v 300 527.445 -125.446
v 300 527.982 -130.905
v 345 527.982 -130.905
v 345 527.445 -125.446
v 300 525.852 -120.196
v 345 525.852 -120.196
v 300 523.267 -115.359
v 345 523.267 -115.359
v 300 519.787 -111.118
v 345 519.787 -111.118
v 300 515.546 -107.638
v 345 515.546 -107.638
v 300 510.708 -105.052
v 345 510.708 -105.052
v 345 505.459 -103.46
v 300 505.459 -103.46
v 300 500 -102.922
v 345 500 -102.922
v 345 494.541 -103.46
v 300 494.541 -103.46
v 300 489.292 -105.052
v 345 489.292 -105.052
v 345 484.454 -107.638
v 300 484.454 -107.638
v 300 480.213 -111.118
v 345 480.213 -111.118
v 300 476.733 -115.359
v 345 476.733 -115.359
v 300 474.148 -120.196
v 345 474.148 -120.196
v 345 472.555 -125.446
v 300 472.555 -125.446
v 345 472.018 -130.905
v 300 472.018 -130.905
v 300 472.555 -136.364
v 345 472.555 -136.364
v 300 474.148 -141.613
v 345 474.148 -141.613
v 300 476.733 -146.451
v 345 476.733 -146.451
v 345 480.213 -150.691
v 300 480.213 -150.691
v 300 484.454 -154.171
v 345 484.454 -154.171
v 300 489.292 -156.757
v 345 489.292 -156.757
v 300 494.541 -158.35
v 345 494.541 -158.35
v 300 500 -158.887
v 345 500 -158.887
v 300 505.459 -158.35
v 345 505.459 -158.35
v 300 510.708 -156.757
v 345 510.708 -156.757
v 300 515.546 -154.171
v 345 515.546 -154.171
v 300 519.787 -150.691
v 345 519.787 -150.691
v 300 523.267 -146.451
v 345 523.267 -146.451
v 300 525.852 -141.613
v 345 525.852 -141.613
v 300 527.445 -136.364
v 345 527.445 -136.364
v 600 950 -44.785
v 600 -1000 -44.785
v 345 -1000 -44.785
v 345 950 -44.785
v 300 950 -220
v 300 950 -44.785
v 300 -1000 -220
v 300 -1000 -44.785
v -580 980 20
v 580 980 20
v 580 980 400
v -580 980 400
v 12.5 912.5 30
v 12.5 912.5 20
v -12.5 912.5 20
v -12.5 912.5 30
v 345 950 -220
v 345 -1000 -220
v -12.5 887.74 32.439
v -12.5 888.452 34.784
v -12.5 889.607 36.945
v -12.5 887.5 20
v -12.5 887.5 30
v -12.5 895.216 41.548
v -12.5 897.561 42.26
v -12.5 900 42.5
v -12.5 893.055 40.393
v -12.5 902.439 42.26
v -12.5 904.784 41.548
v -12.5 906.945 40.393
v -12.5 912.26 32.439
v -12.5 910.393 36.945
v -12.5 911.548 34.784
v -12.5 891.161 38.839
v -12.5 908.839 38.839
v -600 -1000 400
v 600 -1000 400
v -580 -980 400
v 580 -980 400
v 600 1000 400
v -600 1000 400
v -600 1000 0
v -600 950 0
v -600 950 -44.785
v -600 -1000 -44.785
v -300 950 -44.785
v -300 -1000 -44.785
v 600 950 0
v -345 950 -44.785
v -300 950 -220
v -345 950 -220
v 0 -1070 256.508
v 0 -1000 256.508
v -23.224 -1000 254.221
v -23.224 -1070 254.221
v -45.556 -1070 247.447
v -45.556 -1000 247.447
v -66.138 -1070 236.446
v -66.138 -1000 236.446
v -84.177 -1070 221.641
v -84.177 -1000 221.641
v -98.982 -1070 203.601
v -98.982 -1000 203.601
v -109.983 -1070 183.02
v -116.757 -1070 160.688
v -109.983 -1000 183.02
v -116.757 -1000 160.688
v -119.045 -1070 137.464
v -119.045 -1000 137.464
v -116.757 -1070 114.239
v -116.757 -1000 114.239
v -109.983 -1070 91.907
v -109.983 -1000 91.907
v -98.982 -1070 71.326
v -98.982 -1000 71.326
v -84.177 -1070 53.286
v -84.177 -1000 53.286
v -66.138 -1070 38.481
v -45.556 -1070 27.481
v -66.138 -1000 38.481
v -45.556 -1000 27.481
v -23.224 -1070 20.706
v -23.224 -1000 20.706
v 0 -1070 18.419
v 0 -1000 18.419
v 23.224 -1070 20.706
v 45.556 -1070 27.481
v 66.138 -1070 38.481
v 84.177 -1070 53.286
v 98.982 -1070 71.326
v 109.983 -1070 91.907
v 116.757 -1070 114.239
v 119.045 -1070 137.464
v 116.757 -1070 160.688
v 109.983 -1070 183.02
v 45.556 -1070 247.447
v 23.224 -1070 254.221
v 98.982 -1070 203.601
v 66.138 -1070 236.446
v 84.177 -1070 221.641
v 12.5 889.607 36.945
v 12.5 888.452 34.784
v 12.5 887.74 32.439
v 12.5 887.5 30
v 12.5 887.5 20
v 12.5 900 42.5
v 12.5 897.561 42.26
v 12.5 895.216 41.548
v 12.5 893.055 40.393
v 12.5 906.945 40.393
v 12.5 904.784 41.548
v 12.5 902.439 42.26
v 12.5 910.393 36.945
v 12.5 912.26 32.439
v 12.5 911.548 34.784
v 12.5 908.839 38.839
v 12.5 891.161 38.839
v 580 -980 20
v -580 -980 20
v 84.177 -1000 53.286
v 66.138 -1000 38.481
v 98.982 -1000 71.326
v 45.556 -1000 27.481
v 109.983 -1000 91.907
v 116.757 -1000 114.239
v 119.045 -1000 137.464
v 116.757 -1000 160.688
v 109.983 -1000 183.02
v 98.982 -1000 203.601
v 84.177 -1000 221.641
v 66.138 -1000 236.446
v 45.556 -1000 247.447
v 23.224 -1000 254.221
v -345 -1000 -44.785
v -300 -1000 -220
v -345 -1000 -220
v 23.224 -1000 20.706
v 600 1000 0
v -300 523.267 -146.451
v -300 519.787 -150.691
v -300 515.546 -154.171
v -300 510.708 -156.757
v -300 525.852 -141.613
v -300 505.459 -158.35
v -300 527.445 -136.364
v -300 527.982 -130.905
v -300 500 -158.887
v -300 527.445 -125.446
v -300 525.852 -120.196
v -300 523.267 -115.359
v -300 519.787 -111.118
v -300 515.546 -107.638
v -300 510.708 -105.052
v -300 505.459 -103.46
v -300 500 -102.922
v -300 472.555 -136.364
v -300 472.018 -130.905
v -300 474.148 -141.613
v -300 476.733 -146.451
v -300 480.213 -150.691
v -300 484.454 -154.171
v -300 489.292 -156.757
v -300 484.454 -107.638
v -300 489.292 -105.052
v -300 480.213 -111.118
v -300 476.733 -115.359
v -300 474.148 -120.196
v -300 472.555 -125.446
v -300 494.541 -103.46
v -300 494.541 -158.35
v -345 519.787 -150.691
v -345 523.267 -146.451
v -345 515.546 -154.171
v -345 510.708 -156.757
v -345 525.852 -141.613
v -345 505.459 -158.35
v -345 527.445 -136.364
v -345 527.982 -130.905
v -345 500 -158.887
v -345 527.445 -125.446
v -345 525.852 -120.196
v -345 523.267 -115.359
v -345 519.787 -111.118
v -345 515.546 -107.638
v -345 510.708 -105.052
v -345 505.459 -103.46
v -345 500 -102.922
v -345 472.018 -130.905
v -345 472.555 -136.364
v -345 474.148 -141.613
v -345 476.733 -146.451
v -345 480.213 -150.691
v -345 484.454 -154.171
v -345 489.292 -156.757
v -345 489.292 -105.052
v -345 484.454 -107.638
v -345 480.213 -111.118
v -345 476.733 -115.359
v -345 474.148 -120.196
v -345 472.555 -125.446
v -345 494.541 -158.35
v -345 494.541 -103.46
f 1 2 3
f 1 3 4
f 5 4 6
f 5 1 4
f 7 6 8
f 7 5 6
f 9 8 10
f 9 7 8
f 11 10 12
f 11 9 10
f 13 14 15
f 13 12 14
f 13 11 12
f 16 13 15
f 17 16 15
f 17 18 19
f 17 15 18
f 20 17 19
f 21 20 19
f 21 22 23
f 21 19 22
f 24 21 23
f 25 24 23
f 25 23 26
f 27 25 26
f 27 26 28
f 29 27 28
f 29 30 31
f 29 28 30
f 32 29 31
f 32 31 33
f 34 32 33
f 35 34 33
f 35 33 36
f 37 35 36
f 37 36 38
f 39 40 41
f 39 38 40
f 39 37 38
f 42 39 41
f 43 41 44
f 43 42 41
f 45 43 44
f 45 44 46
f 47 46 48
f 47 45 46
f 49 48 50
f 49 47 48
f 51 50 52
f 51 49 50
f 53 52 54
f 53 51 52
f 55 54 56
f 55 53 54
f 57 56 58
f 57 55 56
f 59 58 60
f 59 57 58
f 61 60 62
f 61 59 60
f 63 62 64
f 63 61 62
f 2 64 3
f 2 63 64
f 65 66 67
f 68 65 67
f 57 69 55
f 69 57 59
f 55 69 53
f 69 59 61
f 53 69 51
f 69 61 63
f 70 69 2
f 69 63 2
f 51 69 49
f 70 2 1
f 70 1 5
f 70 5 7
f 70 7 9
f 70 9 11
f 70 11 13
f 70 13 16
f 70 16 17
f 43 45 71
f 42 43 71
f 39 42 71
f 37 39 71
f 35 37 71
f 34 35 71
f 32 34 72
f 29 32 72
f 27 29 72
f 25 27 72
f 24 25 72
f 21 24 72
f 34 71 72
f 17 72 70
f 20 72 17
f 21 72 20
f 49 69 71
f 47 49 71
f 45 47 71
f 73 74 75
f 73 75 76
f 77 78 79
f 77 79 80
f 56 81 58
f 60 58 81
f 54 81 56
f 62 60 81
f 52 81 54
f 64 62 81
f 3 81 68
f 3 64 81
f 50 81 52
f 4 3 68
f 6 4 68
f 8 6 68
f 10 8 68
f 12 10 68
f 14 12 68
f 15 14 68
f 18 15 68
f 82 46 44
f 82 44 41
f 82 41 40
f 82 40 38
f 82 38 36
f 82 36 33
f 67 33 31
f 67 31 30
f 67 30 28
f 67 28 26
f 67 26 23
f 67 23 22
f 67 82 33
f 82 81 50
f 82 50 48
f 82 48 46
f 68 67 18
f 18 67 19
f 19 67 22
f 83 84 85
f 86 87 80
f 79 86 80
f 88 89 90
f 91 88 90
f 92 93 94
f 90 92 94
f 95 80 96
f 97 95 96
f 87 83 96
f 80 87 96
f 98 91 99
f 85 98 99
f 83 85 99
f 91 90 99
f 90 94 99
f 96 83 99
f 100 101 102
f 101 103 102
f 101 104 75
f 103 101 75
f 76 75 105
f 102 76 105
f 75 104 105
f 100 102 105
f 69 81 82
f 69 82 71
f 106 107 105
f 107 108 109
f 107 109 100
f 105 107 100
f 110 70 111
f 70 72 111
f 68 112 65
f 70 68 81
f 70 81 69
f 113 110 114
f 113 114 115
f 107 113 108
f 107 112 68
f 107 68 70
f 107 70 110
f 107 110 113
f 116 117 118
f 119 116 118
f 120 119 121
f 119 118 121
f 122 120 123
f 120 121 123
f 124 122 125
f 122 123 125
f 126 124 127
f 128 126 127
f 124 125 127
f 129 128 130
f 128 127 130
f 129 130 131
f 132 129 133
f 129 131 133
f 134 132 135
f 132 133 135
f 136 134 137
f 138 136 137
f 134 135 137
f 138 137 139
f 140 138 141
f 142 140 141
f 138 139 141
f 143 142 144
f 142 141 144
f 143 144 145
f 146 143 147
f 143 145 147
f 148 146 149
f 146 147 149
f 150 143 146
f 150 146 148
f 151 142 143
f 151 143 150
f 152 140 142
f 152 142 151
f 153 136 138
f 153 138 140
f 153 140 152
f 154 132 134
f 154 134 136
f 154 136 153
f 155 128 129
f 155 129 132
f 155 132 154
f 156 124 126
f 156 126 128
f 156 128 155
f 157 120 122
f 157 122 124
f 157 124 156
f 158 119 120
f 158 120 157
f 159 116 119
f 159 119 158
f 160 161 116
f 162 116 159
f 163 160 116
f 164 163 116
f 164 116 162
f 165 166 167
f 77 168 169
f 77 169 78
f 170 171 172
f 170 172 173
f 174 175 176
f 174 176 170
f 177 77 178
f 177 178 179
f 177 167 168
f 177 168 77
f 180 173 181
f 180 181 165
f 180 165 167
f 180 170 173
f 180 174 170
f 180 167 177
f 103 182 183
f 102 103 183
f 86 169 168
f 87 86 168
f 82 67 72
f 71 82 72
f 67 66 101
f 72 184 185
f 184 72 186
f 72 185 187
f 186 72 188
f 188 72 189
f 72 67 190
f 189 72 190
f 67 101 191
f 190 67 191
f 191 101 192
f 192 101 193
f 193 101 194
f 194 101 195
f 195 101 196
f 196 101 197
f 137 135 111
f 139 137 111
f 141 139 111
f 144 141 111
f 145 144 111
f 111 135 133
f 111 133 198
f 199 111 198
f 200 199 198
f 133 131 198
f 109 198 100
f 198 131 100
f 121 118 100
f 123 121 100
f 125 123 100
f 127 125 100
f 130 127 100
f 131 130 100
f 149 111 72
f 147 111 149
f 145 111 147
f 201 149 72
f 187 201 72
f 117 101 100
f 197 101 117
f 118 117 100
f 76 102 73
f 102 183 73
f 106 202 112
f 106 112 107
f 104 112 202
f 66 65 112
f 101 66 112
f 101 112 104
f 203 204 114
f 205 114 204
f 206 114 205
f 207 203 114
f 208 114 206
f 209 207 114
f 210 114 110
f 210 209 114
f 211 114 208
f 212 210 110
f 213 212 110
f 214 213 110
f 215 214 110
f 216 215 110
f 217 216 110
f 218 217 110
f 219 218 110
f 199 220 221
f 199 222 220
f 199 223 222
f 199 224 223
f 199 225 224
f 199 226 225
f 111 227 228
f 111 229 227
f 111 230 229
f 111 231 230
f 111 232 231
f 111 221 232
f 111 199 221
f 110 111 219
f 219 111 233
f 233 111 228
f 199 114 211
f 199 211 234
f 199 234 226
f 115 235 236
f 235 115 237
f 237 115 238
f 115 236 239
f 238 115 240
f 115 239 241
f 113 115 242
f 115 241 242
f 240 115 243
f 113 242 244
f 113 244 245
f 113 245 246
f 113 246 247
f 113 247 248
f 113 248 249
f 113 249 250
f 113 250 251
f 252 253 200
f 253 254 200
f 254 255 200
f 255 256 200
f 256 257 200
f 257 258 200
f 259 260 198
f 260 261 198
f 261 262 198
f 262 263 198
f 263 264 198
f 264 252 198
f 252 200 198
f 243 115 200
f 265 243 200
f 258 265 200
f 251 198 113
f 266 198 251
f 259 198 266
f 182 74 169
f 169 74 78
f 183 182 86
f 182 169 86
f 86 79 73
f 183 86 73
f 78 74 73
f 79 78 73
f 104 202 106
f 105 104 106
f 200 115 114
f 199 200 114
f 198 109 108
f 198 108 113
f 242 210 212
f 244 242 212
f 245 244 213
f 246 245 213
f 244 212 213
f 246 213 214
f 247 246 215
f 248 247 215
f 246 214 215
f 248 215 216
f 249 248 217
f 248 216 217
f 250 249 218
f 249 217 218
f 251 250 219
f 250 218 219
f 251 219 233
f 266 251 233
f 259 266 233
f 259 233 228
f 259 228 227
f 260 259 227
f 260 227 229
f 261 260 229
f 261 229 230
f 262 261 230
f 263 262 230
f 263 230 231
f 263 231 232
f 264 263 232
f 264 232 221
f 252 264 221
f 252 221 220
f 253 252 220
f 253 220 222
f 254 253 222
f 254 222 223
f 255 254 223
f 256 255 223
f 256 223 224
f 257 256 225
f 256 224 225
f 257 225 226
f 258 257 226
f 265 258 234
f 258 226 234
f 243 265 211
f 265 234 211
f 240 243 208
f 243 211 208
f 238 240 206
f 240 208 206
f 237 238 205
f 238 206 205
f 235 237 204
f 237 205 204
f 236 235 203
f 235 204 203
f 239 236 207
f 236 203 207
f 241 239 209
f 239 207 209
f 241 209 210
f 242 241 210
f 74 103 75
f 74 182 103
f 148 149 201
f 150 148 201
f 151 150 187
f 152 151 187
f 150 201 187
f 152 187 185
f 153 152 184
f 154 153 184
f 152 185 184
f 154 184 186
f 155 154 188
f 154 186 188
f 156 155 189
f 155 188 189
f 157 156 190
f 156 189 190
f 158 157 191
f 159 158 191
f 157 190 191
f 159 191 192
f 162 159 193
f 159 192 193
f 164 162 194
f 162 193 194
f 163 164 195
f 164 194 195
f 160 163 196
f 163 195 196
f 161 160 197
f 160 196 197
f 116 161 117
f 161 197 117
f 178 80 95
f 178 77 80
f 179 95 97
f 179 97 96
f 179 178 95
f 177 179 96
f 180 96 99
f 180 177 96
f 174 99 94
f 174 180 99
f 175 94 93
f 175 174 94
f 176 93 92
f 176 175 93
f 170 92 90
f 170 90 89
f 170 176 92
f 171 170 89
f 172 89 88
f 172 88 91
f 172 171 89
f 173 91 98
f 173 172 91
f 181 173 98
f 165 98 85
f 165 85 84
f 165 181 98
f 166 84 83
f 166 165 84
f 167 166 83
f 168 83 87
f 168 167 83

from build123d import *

# Parameters (mm, degrees)
F0_W           = 600
F0_H           = 2000
F1_DEPTH       = 400
F2_T           = -20
F4_DEPTH       = 70
F5_W           = 25
F5_H           = 30
F6_DEPTH       = 12.5
F7_W           = 300
F7_H           = 44.7851331079
F7_W_2         = 45
F7_W_3         = 255
F7_H_2         = 175.2148668921
F8_DEPTH       = 1000
F8_DEPTH_BACK  = 950
F10_R          = 27.9824593268
F11_DEPTH      = 600.001
F11_DEPTH_BACK = 600.001


with BuildPart() as f1:
    # F0 (on Top) → F1 (new body)
    with BuildSketch(Plane.XY):
        with Locations((-300, 0)):
            Rectangle(F0_W, F0_H)
    extrude(amount=F1_DEPTH)

    # F2
    f2_openings = [f1.faces().sort_by_distance(p)[0] for p in [
        (-300, 0, 400),
        (0, 0, 200),
    ]]
    offset(amount=F2_T, openings=f2_openings)

    # F3 (on face) → F4 (join)
    with BuildSketch(Plane.XZ.offset(1000)):
        with BuildLine():
            Line((0, 18.4187632612), (0, 256.5082568117))
            ThreePointArc((0, 256.5082568117), (-119.0447467752, 137.4635100365), (0, 18.4187632612))
        make_face()
        with BuildLine():
            ThreePointArc((0, 18.4187632612), (84.1773477094, 53.2861623271), (119.0447467752, 137.4635100365))
            ThreePointArc((119.0447467752, 137.4635100365), (84.1773477094, 221.6408577459), (0, 256.5082568117))
            Line((0, 256.5082568117), (0, 18.4187632612))
        make_face()
    extrude(amount=F4_DEPTH)

    # F5 (on Right) → F6 (join, symmetric)
    with BuildSketch(Plane.YZ):
        with Locations((900, 15)):
            Rectangle(F5_W, F5_H)
        with BuildLine():
            ThreePointArc((912.5, 30), (900, 42.5), (887.5, 30))
            Line((887.5, 30), (912.5, 30))
        make_face()
    extrude(amount=F6_DEPTH, both=True)

    # F7 (on Front) → F8 (join, two sides)
    with BuildSketch(Plane.XZ) as f8_sk:
        with Locations((-150, -22.392566554)):
            Rectangle(F7_W, F7_H)
        with Locations((-322.5, -22.392566554)):
            Rectangle(F7_W_2, F7_H)
        with Locations((-472.5, -22.392566554)):
            Rectangle(F7_W_3, F7_H)
        with Locations((-322.5, -132.392566554)):
            Rectangle(F7_W_2, F7_H_2)
    extrude(amount=F8_DEPTH)
    extrude(f8_sk.sketch, amount=-F8_DEPTH_BACK)

    # F9: F1 across plane


with BuildPart() as f1_1:
    add(f1.part)
    add(f1.part.mirror(Plane.YZ))

    # F10 (on Right) → F11 (cut, two sides)
    with BuildSketch(Plane.YZ) as f11_sk:
        with Locations((500, -130.9047937393)):
            Circle(F10_R)
    extrude(amount=-F11_DEPTH, mode=Mode.SUBTRACT)
    extrude(f11_sk.sketch, amount=F11_DEPTH_BACK, mode=Mode.SUBTRACT)


solid = f1_1.part
